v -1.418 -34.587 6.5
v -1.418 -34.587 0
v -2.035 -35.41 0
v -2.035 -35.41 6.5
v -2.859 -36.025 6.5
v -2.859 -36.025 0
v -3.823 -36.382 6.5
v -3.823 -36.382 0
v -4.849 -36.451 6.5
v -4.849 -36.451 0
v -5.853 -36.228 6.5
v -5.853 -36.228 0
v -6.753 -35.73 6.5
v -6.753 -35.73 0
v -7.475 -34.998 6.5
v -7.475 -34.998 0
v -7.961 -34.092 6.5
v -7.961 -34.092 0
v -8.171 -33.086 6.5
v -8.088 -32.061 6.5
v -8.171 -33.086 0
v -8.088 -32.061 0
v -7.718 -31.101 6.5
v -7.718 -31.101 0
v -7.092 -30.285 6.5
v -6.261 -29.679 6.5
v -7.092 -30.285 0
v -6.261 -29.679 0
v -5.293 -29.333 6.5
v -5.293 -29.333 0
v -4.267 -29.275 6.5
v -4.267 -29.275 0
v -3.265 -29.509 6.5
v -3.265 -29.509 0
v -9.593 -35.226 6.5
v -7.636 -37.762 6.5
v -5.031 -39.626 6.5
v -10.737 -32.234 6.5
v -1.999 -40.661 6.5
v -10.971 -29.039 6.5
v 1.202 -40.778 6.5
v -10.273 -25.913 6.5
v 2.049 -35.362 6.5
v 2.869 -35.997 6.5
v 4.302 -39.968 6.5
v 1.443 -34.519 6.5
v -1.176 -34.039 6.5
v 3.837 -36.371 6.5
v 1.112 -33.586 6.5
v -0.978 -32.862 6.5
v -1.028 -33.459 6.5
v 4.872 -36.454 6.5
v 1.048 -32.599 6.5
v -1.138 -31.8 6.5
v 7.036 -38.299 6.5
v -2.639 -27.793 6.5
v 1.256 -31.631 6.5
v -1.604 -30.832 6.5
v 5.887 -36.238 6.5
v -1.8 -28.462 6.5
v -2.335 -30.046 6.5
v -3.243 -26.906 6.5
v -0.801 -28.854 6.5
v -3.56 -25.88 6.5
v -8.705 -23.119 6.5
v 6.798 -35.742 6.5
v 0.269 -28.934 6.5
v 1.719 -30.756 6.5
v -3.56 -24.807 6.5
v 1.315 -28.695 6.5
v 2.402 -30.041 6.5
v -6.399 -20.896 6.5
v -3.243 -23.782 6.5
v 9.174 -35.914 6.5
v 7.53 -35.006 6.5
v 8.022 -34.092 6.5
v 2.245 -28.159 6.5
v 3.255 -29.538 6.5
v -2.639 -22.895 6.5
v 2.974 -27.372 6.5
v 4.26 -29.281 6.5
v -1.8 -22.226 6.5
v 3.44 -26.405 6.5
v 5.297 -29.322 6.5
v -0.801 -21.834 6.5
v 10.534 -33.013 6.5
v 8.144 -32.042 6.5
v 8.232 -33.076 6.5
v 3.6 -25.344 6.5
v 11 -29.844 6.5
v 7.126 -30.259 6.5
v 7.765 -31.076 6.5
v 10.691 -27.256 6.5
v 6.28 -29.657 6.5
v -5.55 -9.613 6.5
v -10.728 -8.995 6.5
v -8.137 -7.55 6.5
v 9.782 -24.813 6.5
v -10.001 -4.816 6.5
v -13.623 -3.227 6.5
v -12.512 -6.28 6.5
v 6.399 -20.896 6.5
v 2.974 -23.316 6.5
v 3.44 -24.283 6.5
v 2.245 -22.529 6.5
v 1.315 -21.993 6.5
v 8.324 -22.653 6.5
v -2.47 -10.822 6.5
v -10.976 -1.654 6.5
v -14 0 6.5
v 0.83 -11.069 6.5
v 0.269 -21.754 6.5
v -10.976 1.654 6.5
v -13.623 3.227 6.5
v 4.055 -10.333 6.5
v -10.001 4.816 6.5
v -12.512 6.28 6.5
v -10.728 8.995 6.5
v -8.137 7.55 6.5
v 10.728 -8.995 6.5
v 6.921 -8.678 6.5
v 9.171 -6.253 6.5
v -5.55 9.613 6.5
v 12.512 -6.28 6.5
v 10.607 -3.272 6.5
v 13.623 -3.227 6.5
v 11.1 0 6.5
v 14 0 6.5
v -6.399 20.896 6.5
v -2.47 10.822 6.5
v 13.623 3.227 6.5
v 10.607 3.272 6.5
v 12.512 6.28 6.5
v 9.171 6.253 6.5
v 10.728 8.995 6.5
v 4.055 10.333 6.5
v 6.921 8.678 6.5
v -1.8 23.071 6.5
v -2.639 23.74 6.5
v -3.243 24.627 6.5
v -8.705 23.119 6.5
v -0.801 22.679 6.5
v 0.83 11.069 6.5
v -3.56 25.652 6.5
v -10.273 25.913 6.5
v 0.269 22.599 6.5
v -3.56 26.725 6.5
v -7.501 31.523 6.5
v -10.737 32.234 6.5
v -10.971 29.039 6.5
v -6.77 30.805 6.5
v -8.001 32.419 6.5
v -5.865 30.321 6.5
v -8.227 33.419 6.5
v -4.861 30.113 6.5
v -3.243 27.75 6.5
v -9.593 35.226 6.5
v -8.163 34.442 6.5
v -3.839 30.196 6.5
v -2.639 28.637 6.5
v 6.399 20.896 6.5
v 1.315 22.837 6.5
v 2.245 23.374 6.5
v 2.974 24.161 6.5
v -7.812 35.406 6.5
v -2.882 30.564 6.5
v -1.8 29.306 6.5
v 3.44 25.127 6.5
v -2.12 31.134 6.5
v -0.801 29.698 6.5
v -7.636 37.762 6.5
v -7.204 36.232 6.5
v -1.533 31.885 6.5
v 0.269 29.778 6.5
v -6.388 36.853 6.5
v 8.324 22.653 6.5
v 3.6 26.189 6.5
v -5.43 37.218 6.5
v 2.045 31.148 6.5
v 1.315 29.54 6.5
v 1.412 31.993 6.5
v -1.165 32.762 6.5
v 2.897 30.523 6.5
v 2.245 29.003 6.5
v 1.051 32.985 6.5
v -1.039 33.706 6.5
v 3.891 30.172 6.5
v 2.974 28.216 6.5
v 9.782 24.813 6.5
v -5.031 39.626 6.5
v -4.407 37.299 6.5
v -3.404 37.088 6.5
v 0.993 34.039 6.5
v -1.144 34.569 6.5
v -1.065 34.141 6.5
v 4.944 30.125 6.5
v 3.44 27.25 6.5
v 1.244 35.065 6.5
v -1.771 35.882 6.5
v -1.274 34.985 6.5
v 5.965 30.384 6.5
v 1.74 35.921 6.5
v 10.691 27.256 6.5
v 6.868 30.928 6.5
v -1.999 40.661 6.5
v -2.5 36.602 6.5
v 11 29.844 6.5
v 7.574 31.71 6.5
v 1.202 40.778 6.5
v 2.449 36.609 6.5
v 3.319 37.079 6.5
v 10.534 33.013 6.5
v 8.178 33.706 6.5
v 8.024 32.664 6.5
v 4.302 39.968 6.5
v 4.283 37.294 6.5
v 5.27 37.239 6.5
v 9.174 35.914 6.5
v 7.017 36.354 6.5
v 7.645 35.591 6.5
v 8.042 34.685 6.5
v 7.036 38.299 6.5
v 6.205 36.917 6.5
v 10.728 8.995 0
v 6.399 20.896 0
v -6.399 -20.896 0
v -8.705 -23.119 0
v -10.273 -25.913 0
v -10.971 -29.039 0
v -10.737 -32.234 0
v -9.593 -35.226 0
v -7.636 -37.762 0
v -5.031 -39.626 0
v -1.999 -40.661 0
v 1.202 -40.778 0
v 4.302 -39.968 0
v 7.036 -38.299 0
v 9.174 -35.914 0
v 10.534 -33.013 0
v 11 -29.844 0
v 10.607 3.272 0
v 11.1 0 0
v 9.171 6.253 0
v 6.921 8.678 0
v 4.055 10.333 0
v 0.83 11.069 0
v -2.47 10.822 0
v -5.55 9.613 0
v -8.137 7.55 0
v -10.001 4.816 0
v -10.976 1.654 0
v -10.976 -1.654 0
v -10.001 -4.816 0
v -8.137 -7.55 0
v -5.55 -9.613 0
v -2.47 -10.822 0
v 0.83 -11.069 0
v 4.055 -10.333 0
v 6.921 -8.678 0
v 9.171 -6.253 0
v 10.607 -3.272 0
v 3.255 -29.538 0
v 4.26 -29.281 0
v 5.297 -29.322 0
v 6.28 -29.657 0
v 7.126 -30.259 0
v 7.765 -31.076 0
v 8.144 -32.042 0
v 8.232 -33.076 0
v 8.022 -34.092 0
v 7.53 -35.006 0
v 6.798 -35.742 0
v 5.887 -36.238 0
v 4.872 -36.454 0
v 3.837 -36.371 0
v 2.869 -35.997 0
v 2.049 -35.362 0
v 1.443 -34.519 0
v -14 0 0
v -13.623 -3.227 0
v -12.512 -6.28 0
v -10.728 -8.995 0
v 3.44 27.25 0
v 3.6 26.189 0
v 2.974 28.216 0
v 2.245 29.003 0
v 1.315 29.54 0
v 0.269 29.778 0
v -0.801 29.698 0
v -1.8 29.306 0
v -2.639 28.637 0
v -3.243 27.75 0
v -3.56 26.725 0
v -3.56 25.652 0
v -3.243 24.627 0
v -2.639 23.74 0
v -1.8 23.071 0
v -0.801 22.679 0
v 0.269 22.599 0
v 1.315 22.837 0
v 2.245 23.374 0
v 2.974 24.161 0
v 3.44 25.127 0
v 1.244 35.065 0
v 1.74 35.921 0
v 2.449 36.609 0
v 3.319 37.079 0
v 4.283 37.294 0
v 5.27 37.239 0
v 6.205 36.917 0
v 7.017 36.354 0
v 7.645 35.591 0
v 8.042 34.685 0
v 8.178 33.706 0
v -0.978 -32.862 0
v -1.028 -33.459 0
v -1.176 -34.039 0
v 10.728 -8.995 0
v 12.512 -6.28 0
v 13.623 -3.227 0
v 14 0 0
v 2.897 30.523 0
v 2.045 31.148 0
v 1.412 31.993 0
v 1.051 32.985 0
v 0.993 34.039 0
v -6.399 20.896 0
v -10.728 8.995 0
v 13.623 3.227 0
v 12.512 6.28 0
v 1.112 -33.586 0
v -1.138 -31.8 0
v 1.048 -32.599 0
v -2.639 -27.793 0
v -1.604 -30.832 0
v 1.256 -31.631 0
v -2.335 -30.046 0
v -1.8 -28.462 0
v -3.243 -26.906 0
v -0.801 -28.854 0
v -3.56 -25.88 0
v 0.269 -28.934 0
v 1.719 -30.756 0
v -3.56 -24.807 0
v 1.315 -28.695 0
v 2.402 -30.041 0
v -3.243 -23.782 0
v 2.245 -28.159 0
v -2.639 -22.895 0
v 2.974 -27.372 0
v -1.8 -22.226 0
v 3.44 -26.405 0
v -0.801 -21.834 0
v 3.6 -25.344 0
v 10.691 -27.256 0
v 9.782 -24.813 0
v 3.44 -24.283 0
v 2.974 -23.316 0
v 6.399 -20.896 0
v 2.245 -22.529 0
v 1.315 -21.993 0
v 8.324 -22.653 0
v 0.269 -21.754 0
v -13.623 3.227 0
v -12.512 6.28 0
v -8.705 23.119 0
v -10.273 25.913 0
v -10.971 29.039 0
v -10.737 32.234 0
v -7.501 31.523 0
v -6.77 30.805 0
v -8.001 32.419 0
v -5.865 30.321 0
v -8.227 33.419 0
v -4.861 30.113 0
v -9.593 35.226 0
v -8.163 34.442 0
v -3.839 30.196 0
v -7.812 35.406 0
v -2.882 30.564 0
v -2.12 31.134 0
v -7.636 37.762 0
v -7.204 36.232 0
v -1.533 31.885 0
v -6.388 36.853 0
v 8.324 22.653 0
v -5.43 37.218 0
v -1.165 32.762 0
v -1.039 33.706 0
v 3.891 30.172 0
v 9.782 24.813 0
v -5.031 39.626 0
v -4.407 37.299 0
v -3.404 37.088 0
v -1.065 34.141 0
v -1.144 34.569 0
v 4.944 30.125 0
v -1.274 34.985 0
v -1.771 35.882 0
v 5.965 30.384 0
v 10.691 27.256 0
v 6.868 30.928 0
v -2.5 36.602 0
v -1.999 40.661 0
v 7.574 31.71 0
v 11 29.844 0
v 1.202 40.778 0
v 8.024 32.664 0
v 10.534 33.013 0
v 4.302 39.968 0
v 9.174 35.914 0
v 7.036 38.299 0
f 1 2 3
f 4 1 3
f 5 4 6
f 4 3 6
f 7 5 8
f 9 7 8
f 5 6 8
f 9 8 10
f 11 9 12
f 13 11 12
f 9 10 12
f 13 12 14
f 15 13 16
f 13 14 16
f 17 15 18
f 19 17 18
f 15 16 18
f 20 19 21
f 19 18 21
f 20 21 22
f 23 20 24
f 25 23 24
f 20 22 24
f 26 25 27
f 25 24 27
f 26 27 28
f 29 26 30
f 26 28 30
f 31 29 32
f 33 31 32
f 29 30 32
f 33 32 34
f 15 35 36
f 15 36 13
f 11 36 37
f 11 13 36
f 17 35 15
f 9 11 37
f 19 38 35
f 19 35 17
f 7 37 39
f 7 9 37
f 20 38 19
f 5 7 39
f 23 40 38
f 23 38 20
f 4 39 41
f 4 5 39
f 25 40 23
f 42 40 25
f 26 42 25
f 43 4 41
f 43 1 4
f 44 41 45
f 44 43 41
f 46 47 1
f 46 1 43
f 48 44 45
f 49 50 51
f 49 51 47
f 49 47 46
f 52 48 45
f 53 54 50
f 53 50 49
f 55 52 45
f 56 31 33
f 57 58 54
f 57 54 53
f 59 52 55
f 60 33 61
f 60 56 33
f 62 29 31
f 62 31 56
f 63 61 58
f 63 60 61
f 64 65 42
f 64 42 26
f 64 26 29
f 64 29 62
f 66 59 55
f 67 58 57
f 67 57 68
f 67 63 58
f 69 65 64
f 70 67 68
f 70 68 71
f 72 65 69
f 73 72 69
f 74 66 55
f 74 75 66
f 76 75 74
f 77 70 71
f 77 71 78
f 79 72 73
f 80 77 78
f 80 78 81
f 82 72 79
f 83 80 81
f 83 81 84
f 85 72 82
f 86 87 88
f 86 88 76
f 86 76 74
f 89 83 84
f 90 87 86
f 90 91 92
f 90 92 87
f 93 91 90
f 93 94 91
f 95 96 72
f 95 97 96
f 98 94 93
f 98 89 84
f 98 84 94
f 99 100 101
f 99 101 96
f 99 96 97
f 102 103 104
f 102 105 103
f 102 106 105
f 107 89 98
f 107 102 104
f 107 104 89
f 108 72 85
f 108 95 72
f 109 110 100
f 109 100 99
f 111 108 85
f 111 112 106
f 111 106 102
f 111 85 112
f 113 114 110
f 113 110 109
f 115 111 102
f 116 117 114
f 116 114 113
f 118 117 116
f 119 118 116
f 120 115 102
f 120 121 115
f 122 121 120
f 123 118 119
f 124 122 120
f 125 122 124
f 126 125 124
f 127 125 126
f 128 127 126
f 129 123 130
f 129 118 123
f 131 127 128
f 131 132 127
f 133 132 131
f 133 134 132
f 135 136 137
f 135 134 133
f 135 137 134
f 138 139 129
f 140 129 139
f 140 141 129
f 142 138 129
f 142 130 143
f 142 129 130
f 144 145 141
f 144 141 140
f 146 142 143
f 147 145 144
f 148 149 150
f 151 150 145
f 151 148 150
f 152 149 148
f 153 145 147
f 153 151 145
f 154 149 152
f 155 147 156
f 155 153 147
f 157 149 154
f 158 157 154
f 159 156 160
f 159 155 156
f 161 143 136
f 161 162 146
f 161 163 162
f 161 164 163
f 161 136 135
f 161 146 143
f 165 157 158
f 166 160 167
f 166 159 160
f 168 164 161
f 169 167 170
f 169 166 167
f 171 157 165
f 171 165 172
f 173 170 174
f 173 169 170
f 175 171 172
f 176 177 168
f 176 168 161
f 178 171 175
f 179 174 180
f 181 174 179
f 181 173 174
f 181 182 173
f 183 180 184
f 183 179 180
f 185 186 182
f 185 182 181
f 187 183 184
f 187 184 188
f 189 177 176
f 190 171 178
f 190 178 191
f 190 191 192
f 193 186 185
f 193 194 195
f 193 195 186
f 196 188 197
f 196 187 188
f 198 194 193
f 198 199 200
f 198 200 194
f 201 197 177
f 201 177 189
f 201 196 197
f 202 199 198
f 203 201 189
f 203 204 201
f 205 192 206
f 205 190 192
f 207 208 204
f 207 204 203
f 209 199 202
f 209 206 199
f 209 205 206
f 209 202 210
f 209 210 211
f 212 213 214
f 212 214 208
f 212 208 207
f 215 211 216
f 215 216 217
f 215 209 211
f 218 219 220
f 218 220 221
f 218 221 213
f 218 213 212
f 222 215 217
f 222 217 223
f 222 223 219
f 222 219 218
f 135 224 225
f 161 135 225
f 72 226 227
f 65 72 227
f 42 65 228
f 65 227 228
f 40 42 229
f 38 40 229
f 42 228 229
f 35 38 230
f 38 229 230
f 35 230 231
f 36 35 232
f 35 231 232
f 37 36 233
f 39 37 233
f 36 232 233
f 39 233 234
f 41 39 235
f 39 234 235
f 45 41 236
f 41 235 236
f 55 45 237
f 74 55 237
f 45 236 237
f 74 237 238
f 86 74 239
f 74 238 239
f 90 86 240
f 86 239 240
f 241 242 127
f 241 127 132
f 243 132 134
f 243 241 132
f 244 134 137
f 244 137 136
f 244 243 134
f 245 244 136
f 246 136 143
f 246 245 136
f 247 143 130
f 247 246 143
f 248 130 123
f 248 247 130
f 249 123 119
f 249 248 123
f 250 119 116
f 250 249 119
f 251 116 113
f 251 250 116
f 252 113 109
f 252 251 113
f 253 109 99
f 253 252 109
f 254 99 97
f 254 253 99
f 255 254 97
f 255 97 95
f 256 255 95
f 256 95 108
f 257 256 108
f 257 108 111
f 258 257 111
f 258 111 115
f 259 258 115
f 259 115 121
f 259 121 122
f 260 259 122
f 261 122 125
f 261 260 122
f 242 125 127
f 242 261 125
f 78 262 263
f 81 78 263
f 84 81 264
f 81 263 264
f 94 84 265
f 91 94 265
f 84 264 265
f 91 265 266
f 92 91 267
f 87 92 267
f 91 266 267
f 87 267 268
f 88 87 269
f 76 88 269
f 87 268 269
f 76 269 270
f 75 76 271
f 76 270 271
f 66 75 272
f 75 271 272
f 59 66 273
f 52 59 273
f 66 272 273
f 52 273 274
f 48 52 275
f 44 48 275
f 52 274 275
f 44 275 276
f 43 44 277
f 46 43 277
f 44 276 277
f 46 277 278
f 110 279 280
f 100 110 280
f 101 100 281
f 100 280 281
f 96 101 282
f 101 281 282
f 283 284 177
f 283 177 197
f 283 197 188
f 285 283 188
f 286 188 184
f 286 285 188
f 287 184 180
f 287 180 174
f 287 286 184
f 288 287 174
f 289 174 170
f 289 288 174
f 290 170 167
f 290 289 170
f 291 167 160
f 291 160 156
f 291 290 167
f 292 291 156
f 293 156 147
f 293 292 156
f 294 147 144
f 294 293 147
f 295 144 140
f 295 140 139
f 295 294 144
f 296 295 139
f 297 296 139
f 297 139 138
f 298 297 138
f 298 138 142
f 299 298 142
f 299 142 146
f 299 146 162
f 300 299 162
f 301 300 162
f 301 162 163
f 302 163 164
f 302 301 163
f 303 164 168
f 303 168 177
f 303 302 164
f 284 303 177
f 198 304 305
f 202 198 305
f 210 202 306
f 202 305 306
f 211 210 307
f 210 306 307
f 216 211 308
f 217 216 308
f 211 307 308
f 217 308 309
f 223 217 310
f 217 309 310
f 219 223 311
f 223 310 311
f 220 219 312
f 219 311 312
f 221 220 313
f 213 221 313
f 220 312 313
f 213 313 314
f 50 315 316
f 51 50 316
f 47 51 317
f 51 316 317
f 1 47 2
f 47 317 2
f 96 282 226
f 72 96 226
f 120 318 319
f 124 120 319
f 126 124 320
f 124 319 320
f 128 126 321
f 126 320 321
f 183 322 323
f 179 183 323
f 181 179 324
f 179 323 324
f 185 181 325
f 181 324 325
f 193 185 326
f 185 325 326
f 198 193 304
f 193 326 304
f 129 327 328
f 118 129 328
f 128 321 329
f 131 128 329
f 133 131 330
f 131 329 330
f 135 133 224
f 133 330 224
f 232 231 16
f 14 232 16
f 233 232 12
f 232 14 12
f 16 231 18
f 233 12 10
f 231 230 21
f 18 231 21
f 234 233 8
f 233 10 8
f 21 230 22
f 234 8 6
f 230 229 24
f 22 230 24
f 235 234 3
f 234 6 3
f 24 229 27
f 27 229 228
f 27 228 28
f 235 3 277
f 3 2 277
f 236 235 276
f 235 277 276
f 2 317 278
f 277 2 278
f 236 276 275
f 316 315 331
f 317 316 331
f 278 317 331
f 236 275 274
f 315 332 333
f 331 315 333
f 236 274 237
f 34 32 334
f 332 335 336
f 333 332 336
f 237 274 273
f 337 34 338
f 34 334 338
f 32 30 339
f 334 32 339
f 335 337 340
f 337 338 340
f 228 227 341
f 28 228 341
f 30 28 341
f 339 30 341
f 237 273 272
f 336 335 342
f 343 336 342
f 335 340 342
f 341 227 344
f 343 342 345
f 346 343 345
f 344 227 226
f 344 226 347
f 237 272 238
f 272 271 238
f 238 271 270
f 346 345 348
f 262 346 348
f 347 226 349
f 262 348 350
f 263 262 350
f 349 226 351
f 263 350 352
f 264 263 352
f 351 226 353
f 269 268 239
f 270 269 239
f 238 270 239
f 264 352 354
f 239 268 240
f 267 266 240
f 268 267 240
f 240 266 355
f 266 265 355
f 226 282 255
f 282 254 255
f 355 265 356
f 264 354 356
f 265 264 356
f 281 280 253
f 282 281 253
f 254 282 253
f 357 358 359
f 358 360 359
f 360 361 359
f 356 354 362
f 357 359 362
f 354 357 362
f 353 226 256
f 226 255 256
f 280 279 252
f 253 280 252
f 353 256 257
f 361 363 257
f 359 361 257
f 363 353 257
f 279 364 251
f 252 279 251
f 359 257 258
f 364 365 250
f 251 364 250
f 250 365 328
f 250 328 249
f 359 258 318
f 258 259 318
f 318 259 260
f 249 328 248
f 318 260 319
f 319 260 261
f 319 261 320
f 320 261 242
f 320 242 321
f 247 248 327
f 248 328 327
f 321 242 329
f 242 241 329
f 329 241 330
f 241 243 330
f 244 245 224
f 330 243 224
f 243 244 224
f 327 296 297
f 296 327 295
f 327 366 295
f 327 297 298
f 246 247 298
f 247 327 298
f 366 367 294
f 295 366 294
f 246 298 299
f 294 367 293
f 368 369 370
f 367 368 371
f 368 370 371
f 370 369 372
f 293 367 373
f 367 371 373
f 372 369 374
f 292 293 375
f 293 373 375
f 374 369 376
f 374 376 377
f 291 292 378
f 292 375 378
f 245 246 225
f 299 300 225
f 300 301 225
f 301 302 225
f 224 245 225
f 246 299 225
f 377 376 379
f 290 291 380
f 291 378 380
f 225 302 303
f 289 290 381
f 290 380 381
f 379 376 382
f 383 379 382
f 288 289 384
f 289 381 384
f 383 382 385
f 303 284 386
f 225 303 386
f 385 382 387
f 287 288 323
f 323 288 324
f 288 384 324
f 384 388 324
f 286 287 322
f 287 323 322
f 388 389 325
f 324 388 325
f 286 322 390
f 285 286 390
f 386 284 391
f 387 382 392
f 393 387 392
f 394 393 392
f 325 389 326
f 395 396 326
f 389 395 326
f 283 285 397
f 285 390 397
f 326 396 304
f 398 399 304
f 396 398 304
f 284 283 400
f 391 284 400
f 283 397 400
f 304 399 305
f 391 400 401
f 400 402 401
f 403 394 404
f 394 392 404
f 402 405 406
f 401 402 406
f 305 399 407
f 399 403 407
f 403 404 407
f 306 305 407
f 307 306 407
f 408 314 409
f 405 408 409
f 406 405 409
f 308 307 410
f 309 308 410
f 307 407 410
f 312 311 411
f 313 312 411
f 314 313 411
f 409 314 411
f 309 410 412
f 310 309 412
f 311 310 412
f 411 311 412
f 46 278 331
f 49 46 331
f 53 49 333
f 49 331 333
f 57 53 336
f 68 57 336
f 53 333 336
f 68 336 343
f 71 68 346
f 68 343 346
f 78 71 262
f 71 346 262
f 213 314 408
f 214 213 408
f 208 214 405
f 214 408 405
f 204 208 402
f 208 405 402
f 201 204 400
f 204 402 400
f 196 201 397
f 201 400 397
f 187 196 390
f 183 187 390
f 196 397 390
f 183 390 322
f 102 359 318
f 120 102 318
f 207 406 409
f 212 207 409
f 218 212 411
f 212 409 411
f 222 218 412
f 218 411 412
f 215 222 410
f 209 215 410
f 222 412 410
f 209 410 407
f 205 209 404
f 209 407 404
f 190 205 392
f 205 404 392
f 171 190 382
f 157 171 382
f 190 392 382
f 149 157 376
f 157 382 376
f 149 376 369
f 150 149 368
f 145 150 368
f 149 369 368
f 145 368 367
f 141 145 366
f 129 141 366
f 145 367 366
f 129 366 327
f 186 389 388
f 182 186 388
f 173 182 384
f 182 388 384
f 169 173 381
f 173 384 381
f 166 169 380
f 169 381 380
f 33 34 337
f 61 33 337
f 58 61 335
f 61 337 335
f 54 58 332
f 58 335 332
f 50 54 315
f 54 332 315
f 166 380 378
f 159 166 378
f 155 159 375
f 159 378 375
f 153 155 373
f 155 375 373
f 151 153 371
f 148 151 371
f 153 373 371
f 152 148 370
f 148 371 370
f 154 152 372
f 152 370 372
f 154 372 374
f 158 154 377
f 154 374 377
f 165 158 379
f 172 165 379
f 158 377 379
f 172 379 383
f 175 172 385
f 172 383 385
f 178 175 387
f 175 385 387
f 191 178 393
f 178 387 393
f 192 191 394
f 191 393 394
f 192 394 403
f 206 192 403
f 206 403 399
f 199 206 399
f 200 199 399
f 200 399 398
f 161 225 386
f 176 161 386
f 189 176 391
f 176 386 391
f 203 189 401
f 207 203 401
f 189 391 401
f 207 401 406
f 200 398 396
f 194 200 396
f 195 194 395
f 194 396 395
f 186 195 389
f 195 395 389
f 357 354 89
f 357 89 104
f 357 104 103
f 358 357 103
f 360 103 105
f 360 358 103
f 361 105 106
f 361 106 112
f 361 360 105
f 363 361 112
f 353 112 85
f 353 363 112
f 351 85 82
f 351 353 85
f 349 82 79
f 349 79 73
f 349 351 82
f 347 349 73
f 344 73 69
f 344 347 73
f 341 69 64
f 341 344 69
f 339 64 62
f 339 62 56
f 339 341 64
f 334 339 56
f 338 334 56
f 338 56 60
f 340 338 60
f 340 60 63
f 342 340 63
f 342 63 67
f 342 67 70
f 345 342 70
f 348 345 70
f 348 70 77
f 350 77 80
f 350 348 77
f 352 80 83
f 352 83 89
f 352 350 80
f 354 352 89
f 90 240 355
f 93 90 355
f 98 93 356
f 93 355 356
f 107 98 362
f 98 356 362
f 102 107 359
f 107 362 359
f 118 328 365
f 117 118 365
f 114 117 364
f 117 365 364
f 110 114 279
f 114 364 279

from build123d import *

# Parameters (mm, degrees)
F0_R     = 11.1
F0_R_2   = 3.6
F1_DEPTH = 6.5


with BuildPart() as f1:
    # F0 (on Top) → F1 (new body)
    with BuildSketch(Plane.XY):
        with BuildLine():
            Line((10.7278155075, -8.9952195325), (14, 0))
            Line((14, 0), (10.7278155075, 8.9952195325))
            ThreePointArc((10.7278155075, 8.9952195325), (0, 14), (-10.7278155075, 8.9952195325))
            Line((-10.7278155075, 8.9952195325), (-14, 0))
            Line((-14, 0), (-10.7278155075, -8.9952195325))
            ThreePointArc((-10.7278155075, -8.9952195325), (0, -14), (10.7278155075, -8.9952195325))
        make_face()
        Circle(F0_R, mode=Mode.SUBTRACT)
        with BuildLine():
            Line((-14, 0), (-10.7278155075, 8.9952195325))
            ThreePointArc((-10.7278155075, 8.9952195325), (-13.1565462243, 4.7859472884), (-14, 0))
        make_face()
        with BuildLine():
            ThreePointArc((-14, 0), (-13.1565462243, -4.7859472884), (-10.7278155075, -8.9952195325))
            Line((-10.7278155075, -8.9952195325), (-14, 0))
        make_face()
        with BuildLine():
            ThreePointArc((10.7278155075, -8.9952195325), (13.1565462243, -4.7859472884), (14, 0))
            Line((14, 0), (10.7278155075, -8.9952195325))
        make_face()
        with BuildLine():
            Line((10.7278155075, 8.9952195325), (14, 0))
            ThreePointArc((14, 0), (13.1565462243, 4.7859472884), (10.7278155075, 8.9952195325))
        make_face()
        with BuildLine():
            ThreePointArc((-6.3985424017, 20.896370611), (0, 18.8439208418), (6.3985424017, 20.896370611))
            Line((6.3985424017, 20.896370611), (2.8967563366, 30.5227637692))
            ThreePointArc((2.8967563366, 30.5227637692), (1.1947786179, 32.4754527121), (1.2443241353, 35.0652919937))
            Line((1.2443241353, 35.0652919937), (0, 38.4859330952))
            Line((0, 38.4859330952), (-1.2735454835, 34.9849626471))
            ThreePointArc((-1.2735454835, 34.9849626471), (-1.0979323396, 34.3562319579), (-1.0387459151, 33.706124872))
            ThreePointArc((-1.0387459151, 33.706124872), (-1.5334959699, 31.8847455108), (-2.8817585693, 30.5639925599))
            Line((-2.8817585693, 30.5639925599), (-6.3985424017, 20.896370611))
        make_face()
        with Locations((0, 26.1885132641)):
            Circle(F0_R_2, mode=Mode.SUBTRACT)
        with BuildLine():
            Line((2.8967563366, 30.5227637692), (6.3985424017, 20.896370611))
            ThreePointArc((6.3985424017, 20.896370611), (9.7822279267, 24.8132134571), (11, 29.8439208418))
            ThreePointArc((11, 29.8439208418), (-5.0307073847, 39.6261487685), (-6.3985424017, 20.896370611))
            Line((-6.3985424017, 20.896370611), (-2.8817585693, 30.5639925599))
            ThreePointArc((-2.8817585693, 30.5639925599), (-8.0218578014, 34.9367970319), (-1.2735454835, 34.9849626471))
            Line((-1.2735454835, 34.9849626471), (0, 38.4859330952))
            Line((0, 38.4859330952), (1.2443241353, 35.0652919937))
            ThreePointArc((1.2443241353, 35.0652919937), (5.2704080391, 37.2388885867), (8.1778905042, 33.706124872))
            ThreePointArc((8.1778905042, 33.706124872), (6.4363733527, 30.6229379653), (2.8967563366, 30.5227637692))
        make_face()
        with BuildLine():
            ThreePointArc((-10.7278155075, 8.9952195325), (0, 14), (10.7278155075, 8.9952195325))
            Line((10.7278155075, 8.9952195325), (6.3985424017, 20.896370611))
            ThreePointArc((6.3985424017, 20.896370611), (0, 18.8439208418), (-6.3985424017, 20.896370611))
            Line((-6.3985424017, 20.896370611), (-10.7278155075, 8.9952195325))
        make_face()
        with BuildLine():
            Line((3.2549400142, -29.5381185512), (6.3985424017, -20.896370611))
            ThreePointArc((6.3985424017, -20.896370611), (0, -18.8439208418), (-6.3985424017, -20.896370611))
            Line((-6.3985424017, -20.896370611), (-3.2654211785, -29.5093058806))
            ThreePointArc((-3.2654211785, -29.5093058806), (-1.6042656478, -30.8323566496), (-0.9778905042, -32.8615326434))
            ThreePointArc((-0.9778905042, -32.8615326434), (-1.0897360598, -33.7519137821), (-1.4183230442, -34.5869698246))
            Line((-1.4183230442, -34.5869698246), (0, -38.4859330952))
            Line((0, -38.4859330952), (1.4430277894, -34.5190565983))
            ThreePointArc((1.4430277894, -34.5190565983), (1.2556340289, -31.6308604836), (3.2549400142, -29.5381185512))
        make_face()
        with Locations((0, -25.3439210355)):
            Circle(F0_R_2, mode=Mode.SUBTRACT)
        with BuildLine():
            Line((6.3985424017, -20.896370611), (10.7278155075, -8.9952195325))
            ThreePointArc((10.7278155075, -8.9952195325), (0, -14), (-10.7278155075, -8.9952195325))
            Line((-10.7278155075, -8.9952195325), (-6.3985424017, -20.896370611))
            ThreePointArc((-6.3985424017, -20.896370611), (0, -18.8439208418), (6.3985424017, -20.896370611))
        make_face()
        with BuildLine():
            ThreePointArc((11, -29.8439208418), (9.7822279267, -24.8132134571), (6.3985424017, -20.896370611))
            Line((6.3985424017, -20.896370611), (3.2549400142, -29.5381185512))
            ThreePointArc((3.2549400142, -29.5381185512), (6.6360314176, -29.8663948133), (8.2387459151, -32.8615326434))
            ThreePointArc((8.2387459151, -32.8615326434), (5.4918035765, -36.3590021038), (1.4430277894, -34.5190565983))
            Line((1.4430277894, -34.5190565983), (0, -38.4859330952))
            Line((0, -38.4859330952), (-1.4183230442, -34.5869698246))
            ThreePointArc((-1.4183230442, -34.5869698246), (-7.9610023904, -34.0922048033), (-3.2654211785, -29.5093058806))
            Line((-3.2654211785, -29.5093058806), (-6.3985424017, -20.896370611))
            ThreePointArc((-6.3985424017, -20.896370611), (-5.0307073847, -39.6261487685), (11, -29.8439208418))
        make_face()
    extrude(amount=F1_DEPTH)


solid = f1.part
